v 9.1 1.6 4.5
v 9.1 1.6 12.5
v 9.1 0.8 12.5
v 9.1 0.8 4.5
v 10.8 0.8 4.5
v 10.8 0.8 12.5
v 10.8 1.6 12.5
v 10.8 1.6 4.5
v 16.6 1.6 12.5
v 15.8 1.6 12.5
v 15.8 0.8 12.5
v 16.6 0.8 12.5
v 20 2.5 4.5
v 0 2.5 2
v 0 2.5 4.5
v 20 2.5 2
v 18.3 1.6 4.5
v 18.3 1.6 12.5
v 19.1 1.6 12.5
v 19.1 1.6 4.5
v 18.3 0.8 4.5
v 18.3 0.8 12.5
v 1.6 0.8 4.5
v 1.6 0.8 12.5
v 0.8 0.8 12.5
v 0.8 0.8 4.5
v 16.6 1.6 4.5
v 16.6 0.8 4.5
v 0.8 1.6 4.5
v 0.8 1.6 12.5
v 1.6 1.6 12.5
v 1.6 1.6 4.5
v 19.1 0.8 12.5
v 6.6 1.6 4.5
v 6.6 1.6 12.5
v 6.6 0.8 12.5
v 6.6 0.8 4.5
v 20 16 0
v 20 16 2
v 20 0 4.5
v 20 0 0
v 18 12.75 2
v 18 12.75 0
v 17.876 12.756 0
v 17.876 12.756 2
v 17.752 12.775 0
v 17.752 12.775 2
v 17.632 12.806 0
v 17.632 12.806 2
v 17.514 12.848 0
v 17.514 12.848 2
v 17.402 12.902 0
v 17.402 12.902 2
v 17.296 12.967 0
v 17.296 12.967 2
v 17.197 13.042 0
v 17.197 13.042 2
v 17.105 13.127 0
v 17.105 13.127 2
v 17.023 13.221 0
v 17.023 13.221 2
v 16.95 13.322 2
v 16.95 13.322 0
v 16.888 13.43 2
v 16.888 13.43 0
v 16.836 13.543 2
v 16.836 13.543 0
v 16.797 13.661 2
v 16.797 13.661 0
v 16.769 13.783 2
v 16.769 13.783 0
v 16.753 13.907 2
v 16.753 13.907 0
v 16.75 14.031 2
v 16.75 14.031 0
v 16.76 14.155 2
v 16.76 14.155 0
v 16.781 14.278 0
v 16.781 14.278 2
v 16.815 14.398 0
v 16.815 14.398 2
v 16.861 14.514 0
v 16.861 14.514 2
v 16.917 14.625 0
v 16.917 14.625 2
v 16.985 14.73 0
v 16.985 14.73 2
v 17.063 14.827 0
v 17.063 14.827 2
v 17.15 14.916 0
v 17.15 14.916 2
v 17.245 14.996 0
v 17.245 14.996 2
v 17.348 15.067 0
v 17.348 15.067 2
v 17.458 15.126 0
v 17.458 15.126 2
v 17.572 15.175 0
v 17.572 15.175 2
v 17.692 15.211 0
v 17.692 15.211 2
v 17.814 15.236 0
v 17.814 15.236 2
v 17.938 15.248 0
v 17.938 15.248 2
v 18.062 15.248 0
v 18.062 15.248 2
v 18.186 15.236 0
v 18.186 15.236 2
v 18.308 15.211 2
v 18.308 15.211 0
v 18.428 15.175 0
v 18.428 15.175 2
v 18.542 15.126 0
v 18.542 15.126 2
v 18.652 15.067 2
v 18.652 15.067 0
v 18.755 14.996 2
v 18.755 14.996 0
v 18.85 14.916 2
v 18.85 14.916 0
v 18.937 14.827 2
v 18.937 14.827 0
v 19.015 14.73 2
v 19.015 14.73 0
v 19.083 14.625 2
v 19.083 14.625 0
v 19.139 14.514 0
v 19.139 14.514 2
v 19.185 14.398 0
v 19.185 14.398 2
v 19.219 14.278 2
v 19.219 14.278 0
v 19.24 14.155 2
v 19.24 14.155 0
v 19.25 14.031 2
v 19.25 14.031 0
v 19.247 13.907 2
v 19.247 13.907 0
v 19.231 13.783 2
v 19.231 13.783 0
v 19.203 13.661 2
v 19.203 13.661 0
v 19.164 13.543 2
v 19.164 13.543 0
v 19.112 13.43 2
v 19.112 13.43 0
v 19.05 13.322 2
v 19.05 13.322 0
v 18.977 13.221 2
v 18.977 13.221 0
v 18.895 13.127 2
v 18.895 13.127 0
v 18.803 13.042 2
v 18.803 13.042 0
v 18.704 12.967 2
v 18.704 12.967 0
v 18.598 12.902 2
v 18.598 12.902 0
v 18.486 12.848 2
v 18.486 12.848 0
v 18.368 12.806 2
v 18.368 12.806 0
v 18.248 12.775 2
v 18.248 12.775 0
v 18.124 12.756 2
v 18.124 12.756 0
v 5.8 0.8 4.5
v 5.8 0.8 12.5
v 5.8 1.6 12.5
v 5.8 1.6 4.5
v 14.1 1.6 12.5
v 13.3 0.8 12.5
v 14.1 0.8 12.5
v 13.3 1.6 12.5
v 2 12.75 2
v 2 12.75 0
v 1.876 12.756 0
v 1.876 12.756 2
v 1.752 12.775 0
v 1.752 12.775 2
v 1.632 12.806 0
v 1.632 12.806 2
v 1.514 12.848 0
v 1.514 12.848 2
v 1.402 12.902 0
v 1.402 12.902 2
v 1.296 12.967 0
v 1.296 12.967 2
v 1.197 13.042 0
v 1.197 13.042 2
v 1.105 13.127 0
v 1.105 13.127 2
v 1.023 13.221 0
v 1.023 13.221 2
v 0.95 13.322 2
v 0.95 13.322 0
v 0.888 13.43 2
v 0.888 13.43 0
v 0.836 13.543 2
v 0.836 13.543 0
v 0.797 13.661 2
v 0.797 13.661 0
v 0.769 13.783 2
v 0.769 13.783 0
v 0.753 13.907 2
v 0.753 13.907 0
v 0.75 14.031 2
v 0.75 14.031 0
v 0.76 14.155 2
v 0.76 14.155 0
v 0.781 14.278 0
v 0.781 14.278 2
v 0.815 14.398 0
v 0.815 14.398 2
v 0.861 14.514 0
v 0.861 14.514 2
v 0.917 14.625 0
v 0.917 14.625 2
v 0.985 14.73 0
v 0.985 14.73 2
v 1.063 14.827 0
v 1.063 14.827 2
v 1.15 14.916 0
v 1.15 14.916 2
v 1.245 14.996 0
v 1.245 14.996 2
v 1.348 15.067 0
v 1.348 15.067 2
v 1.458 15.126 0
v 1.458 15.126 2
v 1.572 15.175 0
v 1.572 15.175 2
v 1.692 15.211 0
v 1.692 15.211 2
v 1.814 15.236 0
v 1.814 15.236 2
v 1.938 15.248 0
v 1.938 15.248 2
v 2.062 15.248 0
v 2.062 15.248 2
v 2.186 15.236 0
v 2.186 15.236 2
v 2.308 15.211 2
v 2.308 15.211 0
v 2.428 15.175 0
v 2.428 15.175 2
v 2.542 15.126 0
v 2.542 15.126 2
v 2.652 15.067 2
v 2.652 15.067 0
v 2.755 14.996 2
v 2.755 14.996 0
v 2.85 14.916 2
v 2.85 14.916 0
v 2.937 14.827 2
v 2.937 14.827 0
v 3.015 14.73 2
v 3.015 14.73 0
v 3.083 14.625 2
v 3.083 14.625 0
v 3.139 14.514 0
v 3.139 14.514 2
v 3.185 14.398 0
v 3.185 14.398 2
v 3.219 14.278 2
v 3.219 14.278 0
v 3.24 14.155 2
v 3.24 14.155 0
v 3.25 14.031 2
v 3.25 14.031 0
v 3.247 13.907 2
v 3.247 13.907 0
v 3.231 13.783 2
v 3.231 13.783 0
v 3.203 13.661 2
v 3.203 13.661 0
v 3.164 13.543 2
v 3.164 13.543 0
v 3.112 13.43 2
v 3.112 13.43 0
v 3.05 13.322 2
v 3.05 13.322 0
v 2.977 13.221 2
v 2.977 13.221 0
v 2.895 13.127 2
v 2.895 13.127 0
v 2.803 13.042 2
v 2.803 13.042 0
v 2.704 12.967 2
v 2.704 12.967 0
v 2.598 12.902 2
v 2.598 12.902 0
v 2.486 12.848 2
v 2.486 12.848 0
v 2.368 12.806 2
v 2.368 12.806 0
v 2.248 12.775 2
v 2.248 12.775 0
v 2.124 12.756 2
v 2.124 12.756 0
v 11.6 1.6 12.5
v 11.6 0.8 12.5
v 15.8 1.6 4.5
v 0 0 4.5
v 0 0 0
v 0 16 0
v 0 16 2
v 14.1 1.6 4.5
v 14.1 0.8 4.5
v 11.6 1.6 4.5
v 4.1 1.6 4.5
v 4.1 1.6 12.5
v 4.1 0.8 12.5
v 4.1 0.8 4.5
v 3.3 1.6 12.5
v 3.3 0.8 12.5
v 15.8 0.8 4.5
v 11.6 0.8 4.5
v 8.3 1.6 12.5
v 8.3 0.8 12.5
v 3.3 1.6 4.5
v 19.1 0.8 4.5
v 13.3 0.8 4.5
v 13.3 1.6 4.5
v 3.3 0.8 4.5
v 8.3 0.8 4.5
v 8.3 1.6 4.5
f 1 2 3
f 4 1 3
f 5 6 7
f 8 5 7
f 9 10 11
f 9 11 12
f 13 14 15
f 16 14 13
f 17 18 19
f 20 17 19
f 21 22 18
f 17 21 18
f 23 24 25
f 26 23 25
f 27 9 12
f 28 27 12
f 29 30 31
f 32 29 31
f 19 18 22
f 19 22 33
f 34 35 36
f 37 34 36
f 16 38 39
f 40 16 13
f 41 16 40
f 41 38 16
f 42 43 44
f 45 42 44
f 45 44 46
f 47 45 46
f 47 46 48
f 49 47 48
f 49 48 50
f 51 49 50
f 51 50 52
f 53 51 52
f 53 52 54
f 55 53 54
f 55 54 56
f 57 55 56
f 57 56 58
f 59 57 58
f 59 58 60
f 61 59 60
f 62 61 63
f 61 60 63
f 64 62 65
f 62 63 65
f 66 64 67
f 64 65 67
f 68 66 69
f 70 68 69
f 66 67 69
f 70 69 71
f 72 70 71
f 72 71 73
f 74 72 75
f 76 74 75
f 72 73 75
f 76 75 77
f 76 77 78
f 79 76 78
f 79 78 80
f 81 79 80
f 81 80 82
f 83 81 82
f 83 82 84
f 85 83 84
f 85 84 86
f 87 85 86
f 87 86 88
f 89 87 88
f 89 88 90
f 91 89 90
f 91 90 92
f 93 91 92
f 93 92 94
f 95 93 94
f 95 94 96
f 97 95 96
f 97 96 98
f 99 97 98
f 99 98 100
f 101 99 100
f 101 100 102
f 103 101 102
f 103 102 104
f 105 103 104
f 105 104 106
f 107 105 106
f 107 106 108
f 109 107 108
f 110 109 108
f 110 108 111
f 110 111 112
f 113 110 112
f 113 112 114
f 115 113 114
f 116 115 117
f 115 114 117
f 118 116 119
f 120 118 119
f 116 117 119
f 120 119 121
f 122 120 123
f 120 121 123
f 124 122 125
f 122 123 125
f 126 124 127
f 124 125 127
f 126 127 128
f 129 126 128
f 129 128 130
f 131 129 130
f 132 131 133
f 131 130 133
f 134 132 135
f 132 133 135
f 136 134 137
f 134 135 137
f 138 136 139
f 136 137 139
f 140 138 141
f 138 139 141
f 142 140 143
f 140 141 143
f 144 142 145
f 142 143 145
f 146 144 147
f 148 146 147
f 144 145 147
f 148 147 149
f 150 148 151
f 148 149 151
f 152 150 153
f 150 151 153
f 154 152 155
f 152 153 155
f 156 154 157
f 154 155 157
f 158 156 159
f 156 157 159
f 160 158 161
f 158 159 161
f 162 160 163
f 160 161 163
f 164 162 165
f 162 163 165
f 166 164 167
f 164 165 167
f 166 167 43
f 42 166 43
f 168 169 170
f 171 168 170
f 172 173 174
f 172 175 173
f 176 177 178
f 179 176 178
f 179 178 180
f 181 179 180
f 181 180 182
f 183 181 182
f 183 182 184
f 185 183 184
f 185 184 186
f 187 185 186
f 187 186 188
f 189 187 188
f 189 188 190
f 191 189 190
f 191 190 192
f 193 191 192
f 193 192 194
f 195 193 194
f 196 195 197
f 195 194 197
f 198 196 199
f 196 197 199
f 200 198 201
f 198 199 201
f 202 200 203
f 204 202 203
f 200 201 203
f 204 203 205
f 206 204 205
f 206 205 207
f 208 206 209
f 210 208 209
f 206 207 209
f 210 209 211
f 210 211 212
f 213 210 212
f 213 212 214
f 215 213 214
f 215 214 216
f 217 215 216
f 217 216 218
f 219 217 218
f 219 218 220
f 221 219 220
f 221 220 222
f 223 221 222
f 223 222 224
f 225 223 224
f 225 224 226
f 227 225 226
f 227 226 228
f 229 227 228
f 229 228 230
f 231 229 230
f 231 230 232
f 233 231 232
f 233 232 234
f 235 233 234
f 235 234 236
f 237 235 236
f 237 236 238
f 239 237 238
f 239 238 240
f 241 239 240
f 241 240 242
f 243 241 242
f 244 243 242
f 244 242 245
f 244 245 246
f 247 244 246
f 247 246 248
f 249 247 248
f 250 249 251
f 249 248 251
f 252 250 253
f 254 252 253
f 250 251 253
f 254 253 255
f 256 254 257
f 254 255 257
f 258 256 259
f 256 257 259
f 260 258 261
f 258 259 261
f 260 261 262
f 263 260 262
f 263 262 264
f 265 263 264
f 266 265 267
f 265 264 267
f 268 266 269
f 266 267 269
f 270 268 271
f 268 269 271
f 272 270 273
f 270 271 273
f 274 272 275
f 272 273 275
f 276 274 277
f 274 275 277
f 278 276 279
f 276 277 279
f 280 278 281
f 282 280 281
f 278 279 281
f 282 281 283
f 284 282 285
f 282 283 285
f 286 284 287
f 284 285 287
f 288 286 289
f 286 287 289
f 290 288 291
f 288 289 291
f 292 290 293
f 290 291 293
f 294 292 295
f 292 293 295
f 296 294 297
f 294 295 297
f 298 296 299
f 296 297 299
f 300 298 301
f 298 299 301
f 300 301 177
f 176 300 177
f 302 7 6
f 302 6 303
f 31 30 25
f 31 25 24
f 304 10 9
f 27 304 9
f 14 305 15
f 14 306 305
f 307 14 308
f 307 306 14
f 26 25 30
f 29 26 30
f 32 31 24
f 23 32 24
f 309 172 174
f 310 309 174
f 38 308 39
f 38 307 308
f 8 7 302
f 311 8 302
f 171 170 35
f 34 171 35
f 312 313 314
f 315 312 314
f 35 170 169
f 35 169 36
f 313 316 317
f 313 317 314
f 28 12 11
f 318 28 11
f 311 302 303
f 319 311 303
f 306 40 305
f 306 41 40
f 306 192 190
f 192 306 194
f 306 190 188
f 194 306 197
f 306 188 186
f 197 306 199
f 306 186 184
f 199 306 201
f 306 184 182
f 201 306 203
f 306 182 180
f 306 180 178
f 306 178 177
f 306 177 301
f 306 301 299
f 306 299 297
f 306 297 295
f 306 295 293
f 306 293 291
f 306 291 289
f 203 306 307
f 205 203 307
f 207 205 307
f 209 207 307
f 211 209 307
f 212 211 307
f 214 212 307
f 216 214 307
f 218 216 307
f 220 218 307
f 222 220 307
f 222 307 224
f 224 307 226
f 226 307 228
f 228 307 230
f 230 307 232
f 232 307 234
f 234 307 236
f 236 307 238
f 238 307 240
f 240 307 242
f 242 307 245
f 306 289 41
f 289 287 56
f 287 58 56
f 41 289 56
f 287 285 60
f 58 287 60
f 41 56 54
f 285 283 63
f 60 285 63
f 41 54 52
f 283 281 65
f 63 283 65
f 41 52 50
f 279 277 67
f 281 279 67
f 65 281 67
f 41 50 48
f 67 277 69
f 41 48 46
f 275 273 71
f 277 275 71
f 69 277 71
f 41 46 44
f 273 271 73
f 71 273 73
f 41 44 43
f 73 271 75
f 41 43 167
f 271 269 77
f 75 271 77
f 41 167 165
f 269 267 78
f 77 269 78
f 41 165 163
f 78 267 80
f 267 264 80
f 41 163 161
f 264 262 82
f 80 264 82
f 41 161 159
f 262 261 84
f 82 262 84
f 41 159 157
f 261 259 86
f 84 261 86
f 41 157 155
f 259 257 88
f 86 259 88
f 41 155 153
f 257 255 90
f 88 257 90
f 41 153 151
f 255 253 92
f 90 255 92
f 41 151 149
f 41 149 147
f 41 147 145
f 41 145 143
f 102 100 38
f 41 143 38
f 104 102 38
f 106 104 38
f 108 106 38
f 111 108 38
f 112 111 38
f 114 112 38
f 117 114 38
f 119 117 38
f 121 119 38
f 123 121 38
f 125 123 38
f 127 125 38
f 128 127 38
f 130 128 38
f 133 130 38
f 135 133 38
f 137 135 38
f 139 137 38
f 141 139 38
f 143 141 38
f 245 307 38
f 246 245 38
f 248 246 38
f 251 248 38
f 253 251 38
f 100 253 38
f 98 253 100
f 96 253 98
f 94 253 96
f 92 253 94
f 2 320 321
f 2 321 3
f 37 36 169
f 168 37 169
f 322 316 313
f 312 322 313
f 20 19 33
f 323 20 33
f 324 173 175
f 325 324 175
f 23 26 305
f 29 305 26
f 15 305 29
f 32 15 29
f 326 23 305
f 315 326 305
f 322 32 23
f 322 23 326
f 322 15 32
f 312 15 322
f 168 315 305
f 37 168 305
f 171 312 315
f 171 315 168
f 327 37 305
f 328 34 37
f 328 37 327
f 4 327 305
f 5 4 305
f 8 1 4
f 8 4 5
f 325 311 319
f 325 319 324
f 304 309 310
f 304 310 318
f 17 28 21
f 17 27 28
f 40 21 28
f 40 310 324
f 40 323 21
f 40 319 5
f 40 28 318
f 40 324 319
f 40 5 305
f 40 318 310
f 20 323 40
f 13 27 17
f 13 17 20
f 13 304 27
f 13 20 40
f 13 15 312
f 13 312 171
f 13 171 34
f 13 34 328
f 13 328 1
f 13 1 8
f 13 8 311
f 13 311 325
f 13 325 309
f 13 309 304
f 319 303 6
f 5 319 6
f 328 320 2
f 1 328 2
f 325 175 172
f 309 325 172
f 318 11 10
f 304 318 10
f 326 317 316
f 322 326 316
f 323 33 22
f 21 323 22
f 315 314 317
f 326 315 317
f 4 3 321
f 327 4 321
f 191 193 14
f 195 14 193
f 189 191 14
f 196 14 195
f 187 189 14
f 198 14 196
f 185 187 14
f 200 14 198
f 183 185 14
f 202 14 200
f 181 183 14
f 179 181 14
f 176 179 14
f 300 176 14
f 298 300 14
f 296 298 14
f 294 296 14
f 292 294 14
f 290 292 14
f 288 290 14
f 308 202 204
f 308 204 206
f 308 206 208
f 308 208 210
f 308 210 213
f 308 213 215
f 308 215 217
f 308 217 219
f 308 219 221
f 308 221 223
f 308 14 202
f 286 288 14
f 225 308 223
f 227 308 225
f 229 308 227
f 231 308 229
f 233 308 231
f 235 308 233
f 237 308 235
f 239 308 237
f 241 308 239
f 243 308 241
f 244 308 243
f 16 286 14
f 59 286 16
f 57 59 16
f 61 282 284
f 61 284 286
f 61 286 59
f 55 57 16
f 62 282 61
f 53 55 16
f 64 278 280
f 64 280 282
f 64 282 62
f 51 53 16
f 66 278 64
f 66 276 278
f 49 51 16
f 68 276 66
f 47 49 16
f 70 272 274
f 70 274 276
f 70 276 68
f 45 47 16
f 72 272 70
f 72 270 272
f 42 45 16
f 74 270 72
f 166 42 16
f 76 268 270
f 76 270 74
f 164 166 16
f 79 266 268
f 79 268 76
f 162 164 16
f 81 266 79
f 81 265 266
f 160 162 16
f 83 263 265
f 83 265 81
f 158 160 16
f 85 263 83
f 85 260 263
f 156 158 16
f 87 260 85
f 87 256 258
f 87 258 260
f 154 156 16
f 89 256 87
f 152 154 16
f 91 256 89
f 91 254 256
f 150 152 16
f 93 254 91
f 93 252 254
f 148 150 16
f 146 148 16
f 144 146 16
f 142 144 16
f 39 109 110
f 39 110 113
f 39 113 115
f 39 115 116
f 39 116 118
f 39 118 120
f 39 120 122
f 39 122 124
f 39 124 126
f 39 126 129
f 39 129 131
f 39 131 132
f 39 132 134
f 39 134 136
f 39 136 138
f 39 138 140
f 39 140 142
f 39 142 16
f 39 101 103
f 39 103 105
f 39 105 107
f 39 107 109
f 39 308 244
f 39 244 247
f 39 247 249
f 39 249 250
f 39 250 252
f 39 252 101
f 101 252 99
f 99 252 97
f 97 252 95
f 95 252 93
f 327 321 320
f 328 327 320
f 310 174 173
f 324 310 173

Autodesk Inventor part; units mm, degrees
ref_plane "YZ Plane" through (0, 0, 0) normal (1, 0, 0) x (0, 1, 0)
ref_plane "XZ Plane" through (0, 0, 0) normal (0, 1, 0) x (-1, 0, 0)
ref_plane "XY Plane" through (0, 0, 0) normal (0, 0, 1) x (1, 0, 0)
sketch "Esquisse1" plane through (0, 0, 0) normal (0, 0, 1) x (1, 0, 0)
  line L0 (0, 16) -> (20, 16)
  line L1 (20, 16) -> (20, 0)
  line L2 (20, 0) -> (0, 0)
  line L3 (0, 0) -> (0, 16)
  line L4 (-4.5575, 0) -> (27.3449, 0) projected
  line L5 (0, -3.2) -> (0, 19.2) projected
  point P0 (0, 0)
  dimension "d0" = 20
  dimension "d1" = 16
extrude "Extrusion1" add sketch "Esquisse1" along normal blind 2
sketch "Esquisse2" plane through (0, 0, 2) normal (0, 0, 1) x (1, 0, 0)
  line L0 (20, 0) -> (20, 16) projected
  line L1 (20, 16) -> (0, 16) projected
  line L2 (0, 16) -> (0, 0) projected
  point P0 (2, 14)
  point P1 (18, 14)
  dimension "d11" = 2
  dimension "d12" = 2
  dimension "d13" = 2
  dimension "d14" = 2
hole "Perçage1" at (2, 14, 2) at (18, 14, 2) direction (0, 0, -1) diameter 2.5 end through all
sketch "Esquisse3" plane through (0, 0, 2) normal (0, 0, 1) x (1, 0, 0)
  line L0 (0, 2.5) -> (2.5, 2.5)
  line L1 (2.5, 2.5) -> (2.5, 0)
  line L2 (2.5, 0) -> (0, 0)
  line L3 (0, 0) -> (0, 2.5)
  line L4 (-4.5575, 0) -> (27.3449, 0) projected
  line L5 (2.5, 2.5) -> (5, 2.5)
  line L6 (5, 2.5) -> (5, 0)
  line L7 (5, 0) -> (2.5, 0)
  line L8 (2.5, 0) -> (2.5, 2.5)
  line L9 (5, 2.5) -> (7.5, 2.5)
  line L10 (7.5, 2.5) -> (7.5, 0)
  line L11 (7.5, 0) -> (5, 0)
  line L12 (5, 0) -> (5, 2.5)
  line L13 (7.5, 2.5) -> (10, 2.5)
  line L14 (10, 2.5) -> (10, 0)
  line L15 (10, 0) -> (7.5, 0)
  line L16 (7.5, 0) -> (7.5, 2.5)
  line L17 (10, 2.5) -> (12.5, 2.5)
  line L18 (12.5, 2.5) -> (12.5, 0)
  line L19 (12.5, 0) -> (10, 0)
  line L20 (10, 0) -> (10, 2.5)
  line L21 (12.5, 2.5) -> (15, 2.5)
  line L22 (15, 2.5) -> (15, 0)
  line L23 (15, 0) -> (12.5, 0)
  line L24 (12.5, 0) -> (12.5, 2.5)
  line L25 (15, 2.5) -> (17.5, 2.5)
  line L26 (17.5, 2.5) -> (17.5, 0)
  line L27 (17.5, 0) -> (15, 0)
  line L28 (15, 0) -> (15, 2.5)
  line L29 (17.5, 2.5) -> (20, 2.5)
  line L30 (20, 2.5) -> (20, 0)
  line L31 (20, 0) -> (17.5, 0)
  line L32 (17.5, 0) -> (17.5, 2.5)
  line L33 (0, 16) -> (0, 0) projected
  line L34 (0, 0) -> (20, 0) projected
  point P0 (2.5, 0)
  point P1 (20, 0)
  dimension "d15" = 2.5
  dimension "d16" = 2.5
  dimension "d19" = 2.5
extrude "Extrusion2" add sketch "Esquisse3" along normal blind 2.5
sketch "Esquisse4" plane through (0, 0, 4.5) normal (0, 0, 1) x (1, 0, 0)
  line L0 (0.8, 1.6) -> (1.6, 1.6)
  line L1 (1.6, 1.6) -> (1.6, 0.8)
  line L2 (1.6, 0.8) -> (0.8, 0.8)
  line L3 (0.8, 0.8) -> (0.8, 1.6)
  line L4 (0, 0) -> (20, 0) projected
  line L5 (0, 2.5) -> (0, 0) projected
  line L6 (3.3, 1.6) -> (4.1, 1.6)
  line L7 (4.1, 1.6) -> (4.1, 0.8)
  line L8 (4.1, 0.8) -> (3.3, 0.8)
  line L9 (3.3, 0.8) -> (3.3, 1.6)
  line L10 (5.8, 1.6) -> (6.6, 1.6)
  line L11 (6.6, 1.6) -> (6.6, 0.8)
  line L12 (6.6, 0.8) -> (5.8, 0.8)
  line L13 (5.8, 0.8) -> (5.8, 1.6)
  line L14 (8.3, 1.6) -> (9.1, 1.6)
  line L15 (9.1, 1.6) -> (9.1, 0.8)
  line L16 (9.1, 0.8) -> (8.3, 0.8)
  line L17 (8.3, 0.8) -> (8.3, 1.6)
  line L18 (10.8, 1.6) -> (11.6, 1.6)
  line L19 (11.6, 1.6) -> (11.6, 0.8)
  line L20 (11.6, 0.8) -> (10.8, 0.8)
  line L21 (10.8, 0.8) -> (10.8, 1.6)
  line L22 (13.3, 1.6) -> (14.1, 1.6)
  line L23 (14.1, 1.6) -> (14.1, 0.8)
  line L24 (14.1, 0.8) -> (13.3, 0.8)
  line L25 (13.3, 0.8) -> (13.3, 1.6)
  line L26 (15.8, 1.6) -> (16.6, 1.6)
  line L27 (16.6, 1.6) -> (16.6, 0.8)
  line L28 (16.6, 0.8) -> (15.8, 0.8)
  line L29 (15.8, 0.8) -> (15.8, 1.6)
  line L30 (18.3, 1.6) -> (19.1, 1.6)
  line L31 (19.1, 1.6) -> (19.1, 0.8)
  line L32 (19.1, 0.8) -> (18.3, 0.8)
  line L33 (18.3, 0.8) -> (18.3, 1.6)
  point P0 (0, 1.25)
  dimension "d26" = 0.8
  dimension "d27" = 0.8
  dimension "d28" = 0.8
  dimension "d29" = 0.8
  dimension "d32" = 2.5
extrude "Extrusion3" add sketch "Esquisse4" along normal blind 8
equation "\"d13\" = d12"
equation "\"d14\" = d11"
equation "\"d16\" = d15"
equation "\"d27\" = d26"
equation "\"d29\" = d28"
properties part number "gyro"
